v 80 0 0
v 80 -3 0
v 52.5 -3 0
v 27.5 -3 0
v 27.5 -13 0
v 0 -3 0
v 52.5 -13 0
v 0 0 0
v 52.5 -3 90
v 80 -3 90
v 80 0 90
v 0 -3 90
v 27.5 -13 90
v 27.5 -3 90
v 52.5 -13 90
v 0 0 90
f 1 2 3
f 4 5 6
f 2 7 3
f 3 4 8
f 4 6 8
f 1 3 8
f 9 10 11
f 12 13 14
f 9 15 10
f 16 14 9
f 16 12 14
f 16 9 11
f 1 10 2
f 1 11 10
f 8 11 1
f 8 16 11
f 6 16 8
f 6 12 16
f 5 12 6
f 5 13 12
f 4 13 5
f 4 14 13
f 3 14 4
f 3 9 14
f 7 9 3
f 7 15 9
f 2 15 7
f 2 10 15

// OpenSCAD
// The width of the shelf (in mm).
$shelfWidth = 80; // [20:200]

// The shelf depth, you can reuse "spacingToBarrel" (in mm).
$shelfDepth = 90; // [10:150]

// The nominal shelf thickness (in mm).
$shelfThickness = 3; // [3:20]

// The notch height, which should probably be less than or equal to the holder height -- I've found ~20-25% is typically sufficient (in mm).
$notchHeight = 10; // [0:50]

// The barrel diameter that was used when generating the barrel holder this will be paired with (in mm).
$barrelDiameter = 20; // [10:50]

{}

$totalWidthForBarrelHolder = $barrelDiameter*1.25;

barrelHolderShelf($shelfWidth, $shelfDepth, $shelfThickness, $totalWidthForBarrelHolder, $notchHeight);

/******** Functions/Modules **********/

// Module: barrelHolderShelf
// Creates a shelf designed to slip over the barrel holders.
//
// Parameters:
// - shelfWidth (number): The total width of the shelf (in mm).
// - shelfDepth (number): The depth of the shelf (in mm).
// - shelfThickness (number): The thickness shelf (in mm).
// - notchWidth (number): The width of the notch used to slip over the barrel holder.
// - notchHeight (number): The height of the notch used to slip over the barrel holder.
module barrelHolderShelf(shelfWidth, shelfDepth, shelfThickness, notchWidth, notchHeight) {
linear_extrude(shelfDepth)
polygon(points=[
    [0,0], 
    [shelfWidth,0], 
    [shelfWidth,-shelfThickness], 
    [shelfWidth/2+notchWidth/2,-notchHeight-shelfThickness],
    [shelfWidth/2+notchWidth/2,-shelfThickness],
    [shelfWidth/2-notchWidth/2,-shelfThickness],
    [shelfWidth/2-notchWidth/2,-notchHeight-shelfThickness],
    [0,-shelfThickness], 
]);
}
